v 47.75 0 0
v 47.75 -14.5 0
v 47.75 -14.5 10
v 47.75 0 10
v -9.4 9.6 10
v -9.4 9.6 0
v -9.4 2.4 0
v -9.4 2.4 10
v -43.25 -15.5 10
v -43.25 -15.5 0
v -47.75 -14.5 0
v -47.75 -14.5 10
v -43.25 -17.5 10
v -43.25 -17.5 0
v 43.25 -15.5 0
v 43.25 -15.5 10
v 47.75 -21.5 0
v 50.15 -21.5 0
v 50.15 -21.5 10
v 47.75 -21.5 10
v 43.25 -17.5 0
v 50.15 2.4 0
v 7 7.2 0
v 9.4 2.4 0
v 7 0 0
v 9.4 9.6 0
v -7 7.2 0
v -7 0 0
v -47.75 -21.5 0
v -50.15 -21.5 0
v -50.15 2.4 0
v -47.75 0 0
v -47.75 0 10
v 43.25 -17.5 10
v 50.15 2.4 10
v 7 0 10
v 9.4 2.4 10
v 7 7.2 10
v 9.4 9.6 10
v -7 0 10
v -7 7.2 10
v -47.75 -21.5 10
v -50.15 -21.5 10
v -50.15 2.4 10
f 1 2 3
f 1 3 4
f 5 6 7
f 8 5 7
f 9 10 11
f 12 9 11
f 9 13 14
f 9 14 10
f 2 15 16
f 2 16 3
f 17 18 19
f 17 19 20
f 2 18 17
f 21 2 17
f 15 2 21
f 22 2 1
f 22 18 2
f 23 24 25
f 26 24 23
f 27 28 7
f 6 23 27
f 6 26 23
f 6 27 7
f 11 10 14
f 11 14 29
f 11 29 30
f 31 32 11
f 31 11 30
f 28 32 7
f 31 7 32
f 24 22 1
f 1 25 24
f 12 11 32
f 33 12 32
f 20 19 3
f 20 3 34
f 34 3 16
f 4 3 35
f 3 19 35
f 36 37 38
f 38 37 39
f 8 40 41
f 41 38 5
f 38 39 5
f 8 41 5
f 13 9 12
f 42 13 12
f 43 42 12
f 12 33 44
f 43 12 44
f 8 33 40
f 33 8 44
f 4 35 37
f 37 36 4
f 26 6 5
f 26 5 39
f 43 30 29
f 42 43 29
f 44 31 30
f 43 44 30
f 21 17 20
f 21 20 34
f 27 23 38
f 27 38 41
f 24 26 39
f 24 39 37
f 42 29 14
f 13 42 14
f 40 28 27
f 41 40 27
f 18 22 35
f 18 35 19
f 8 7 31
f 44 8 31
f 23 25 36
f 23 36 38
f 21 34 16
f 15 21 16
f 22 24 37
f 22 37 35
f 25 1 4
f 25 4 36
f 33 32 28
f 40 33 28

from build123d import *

# Parameters (mm, degrees)
F2_DEPTH = 10


with BuildPart() as f2:
    # F1 (on Top) → F2 (new body)
    with BuildSketch(Plane.XY):
        Polygon((-7, 7.2), (0, 7.2), (0, 9.6), (-9.4, 9.6), (-9.4, 2.4), (-50.15, 2.4), (-50.15, -21.5), (-47.75, -21.5), (-43.25, -17.5), (-43.25, -15.5), (-47.75, -14.5), (-47.75, 0), (-7, 0), align=None)
    extrude(amount=F2_DEPTH)

    # F3: F2 across plane


with BuildPart() as f2_1:
    add(f2.part)
    add(f2.part.mirror(Plane.YZ))


solid = f2_1.part
